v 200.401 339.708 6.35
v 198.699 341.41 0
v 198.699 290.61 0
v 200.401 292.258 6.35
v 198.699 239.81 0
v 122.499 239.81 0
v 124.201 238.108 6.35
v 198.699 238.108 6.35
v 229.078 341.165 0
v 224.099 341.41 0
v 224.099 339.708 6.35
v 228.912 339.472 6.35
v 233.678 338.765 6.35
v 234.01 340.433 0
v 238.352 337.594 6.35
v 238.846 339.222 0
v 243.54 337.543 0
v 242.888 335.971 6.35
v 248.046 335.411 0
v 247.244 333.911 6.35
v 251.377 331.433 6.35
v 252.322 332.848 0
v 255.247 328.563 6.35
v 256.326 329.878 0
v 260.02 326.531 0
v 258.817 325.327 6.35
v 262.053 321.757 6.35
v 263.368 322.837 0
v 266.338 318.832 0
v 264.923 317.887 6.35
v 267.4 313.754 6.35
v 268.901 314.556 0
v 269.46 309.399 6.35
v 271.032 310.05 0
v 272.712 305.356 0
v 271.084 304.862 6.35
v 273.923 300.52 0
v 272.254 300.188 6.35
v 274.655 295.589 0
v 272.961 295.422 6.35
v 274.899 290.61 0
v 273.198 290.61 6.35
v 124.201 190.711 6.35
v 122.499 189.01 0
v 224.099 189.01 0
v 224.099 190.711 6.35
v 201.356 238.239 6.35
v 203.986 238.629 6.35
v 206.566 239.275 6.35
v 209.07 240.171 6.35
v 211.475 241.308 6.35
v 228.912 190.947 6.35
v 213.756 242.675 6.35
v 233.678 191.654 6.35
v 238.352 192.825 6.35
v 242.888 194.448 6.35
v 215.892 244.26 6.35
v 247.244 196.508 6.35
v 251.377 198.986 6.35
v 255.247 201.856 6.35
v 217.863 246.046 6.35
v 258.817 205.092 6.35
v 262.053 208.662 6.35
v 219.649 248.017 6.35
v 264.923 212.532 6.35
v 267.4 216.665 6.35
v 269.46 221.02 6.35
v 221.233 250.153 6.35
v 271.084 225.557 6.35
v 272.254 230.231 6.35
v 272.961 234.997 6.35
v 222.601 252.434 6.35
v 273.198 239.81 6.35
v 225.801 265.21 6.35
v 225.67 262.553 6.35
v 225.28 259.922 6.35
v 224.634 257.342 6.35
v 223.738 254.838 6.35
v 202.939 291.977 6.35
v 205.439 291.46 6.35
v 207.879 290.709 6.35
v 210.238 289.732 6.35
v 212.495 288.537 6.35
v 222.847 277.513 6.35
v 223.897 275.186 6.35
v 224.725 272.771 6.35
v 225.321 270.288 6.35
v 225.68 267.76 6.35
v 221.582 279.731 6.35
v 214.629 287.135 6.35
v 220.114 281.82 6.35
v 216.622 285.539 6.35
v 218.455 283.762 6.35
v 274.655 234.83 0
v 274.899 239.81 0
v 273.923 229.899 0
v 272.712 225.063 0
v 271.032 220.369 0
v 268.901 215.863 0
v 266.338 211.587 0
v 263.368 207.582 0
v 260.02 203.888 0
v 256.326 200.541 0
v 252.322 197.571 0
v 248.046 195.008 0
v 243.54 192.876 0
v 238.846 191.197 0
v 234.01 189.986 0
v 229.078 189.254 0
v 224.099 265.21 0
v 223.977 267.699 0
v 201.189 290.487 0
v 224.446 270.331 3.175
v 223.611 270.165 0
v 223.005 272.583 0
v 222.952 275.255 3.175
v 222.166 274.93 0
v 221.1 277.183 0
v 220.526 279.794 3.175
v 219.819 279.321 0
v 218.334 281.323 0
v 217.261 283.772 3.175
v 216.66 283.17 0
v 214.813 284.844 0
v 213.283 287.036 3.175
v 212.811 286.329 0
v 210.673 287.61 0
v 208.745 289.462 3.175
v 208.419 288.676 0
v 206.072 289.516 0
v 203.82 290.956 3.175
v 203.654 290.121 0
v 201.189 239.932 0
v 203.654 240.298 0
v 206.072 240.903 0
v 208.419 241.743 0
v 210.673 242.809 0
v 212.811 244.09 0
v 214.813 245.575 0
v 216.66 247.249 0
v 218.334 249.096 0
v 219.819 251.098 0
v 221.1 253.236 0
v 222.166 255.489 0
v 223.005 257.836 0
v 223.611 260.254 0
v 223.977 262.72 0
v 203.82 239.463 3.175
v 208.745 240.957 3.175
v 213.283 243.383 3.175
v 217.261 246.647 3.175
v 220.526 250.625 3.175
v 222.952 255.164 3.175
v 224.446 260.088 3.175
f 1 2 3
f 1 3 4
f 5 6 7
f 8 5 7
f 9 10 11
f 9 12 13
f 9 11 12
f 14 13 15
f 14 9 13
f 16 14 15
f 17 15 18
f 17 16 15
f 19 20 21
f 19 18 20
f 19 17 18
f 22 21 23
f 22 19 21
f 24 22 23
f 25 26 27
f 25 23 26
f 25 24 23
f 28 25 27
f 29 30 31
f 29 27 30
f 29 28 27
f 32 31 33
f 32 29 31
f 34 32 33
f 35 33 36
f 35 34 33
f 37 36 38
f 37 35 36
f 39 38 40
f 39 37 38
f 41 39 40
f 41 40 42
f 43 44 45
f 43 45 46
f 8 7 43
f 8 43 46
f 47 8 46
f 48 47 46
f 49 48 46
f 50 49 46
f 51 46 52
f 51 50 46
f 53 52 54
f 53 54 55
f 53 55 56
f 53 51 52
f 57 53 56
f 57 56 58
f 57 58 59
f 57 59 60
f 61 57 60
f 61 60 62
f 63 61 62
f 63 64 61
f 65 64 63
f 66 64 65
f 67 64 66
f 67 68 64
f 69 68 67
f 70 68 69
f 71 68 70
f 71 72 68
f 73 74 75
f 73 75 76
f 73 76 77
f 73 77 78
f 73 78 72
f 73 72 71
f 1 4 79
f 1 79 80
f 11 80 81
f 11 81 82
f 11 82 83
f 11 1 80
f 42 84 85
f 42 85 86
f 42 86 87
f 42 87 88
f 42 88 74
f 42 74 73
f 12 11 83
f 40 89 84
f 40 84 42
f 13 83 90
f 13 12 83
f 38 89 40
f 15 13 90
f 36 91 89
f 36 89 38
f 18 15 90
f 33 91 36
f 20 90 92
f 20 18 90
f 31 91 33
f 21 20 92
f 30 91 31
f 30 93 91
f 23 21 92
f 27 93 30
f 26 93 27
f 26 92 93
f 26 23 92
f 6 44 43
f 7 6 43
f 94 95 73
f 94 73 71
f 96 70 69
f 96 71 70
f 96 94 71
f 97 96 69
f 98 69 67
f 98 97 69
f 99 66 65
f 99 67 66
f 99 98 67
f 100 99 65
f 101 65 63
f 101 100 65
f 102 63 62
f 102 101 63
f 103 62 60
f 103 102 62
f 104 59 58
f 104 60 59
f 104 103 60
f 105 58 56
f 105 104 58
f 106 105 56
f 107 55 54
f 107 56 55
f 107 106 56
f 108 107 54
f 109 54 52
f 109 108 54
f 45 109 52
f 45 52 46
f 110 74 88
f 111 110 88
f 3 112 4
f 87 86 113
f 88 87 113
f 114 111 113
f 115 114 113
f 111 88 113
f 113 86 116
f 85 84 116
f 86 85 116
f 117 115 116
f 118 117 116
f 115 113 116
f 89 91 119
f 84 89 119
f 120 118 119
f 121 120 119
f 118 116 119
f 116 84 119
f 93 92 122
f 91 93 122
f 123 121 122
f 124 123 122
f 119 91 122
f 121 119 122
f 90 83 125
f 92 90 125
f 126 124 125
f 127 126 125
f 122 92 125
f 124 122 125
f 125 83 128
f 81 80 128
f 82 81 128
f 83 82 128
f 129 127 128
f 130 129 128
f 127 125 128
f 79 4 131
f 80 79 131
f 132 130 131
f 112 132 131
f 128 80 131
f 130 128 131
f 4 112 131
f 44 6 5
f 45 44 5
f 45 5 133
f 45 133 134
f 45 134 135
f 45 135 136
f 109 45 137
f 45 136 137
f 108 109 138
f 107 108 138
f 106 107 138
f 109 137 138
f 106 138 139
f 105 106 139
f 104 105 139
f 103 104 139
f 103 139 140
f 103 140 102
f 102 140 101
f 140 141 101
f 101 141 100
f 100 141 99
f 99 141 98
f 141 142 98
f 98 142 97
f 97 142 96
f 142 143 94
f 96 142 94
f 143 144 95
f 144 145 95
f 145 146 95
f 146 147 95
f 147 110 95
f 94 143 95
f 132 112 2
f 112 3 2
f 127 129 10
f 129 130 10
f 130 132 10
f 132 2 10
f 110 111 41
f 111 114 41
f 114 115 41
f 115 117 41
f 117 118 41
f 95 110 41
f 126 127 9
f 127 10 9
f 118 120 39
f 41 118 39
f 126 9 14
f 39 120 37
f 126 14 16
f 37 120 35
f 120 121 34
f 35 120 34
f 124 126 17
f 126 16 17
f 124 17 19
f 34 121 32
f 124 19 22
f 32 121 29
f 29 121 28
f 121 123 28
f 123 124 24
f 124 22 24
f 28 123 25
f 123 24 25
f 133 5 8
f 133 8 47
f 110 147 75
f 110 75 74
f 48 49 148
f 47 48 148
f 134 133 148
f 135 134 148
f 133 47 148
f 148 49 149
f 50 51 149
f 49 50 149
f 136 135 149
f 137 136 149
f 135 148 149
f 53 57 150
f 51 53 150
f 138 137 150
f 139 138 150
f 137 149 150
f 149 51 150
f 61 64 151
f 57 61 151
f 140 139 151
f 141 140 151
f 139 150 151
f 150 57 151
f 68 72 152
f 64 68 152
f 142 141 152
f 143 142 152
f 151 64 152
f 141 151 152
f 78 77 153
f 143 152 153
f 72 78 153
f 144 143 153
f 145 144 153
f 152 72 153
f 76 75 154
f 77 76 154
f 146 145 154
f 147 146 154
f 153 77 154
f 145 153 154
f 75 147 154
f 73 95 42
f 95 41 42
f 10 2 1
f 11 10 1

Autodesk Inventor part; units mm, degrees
ref_plane "YZ Plane" through (0, 0, 0) normal (1, 0, 0) x (0, 1, 0)
ref_plane "XZ Plane" through (0, 0, 0) normal (0, 1, 0) x (-1, 0, 0)
ref_plane "XY Plane" through (0, 0, 0) normal (0, 0, 1) x (1, 0, 0)
sketch "Sketch1" plane through (0, 0, 0) normal (0, 0, 1) x (1, 0, 0)
  line L0 (198.6992, 341.4095) -> (224.0992, 341.4095)
  line L1 (274.8992, 290.6095) -> (274.8992, 239.8095)
  line L2 (224.0992, 189.0095) -> (122.4992, 189.0095)
  line L3 (198.4116, 290.6095) -> (198.6992, 290.6095)
  line L4 (224.0992, 265.2095) -> (224.0992, 265.2095)
  line L5 (198.6992, 239.8095) -> (122.4992, 239.8095)
  line L6 (198.6992, 341.4095) -> (198.6992, 290.6095)
  line L7 (122.4992, 239.8095) -> (122.4992, 189.0095)
  arc A0 (224.0992, 265.2095) -> (198.6992, 290.6095) centre (198.6992, 265.2095) ccw
  arc A1 (198.6992, 239.8095) -> (224.0992, 265.2095) centre (198.6992, 265.2095) ccw
  arc A2 (274.8992, 290.6095) -> (224.0992, 341.4095) centre (224.0992, 290.6095) ccw
  arc A3 (224.0992, 189.0095) -> (274.8992, 239.8095) centre (224.0992, 239.8095) ccw
  circle A4 centre (143.7935, 214.4095) radius 12.7
  point P0 (0, 0)
  point P1 (274.8992, 341.4095)
  point P2 (274.8992, 189.0095)
  point P3 (274.8992, 265.2095)
  dimension "d0" = 50.8
  dimension "d1" = 50.8
  dimension "d2" = 50.8
  dimension "d3" = 50.8
  dimension "d6" = 152.4
  dimension "d7" = 25.4
  dimension "d8" = 25.4
  dimension "d9" = 50.8
  dimension "d12" = 25.4
extrude "Extrusion1" add sketch "Sketch1" along normal blind 6.35 draft -15 contours L0 A2 L1 A3 L2 L7 L5 A1 A0 L6 | A4
properties part number "hook"
